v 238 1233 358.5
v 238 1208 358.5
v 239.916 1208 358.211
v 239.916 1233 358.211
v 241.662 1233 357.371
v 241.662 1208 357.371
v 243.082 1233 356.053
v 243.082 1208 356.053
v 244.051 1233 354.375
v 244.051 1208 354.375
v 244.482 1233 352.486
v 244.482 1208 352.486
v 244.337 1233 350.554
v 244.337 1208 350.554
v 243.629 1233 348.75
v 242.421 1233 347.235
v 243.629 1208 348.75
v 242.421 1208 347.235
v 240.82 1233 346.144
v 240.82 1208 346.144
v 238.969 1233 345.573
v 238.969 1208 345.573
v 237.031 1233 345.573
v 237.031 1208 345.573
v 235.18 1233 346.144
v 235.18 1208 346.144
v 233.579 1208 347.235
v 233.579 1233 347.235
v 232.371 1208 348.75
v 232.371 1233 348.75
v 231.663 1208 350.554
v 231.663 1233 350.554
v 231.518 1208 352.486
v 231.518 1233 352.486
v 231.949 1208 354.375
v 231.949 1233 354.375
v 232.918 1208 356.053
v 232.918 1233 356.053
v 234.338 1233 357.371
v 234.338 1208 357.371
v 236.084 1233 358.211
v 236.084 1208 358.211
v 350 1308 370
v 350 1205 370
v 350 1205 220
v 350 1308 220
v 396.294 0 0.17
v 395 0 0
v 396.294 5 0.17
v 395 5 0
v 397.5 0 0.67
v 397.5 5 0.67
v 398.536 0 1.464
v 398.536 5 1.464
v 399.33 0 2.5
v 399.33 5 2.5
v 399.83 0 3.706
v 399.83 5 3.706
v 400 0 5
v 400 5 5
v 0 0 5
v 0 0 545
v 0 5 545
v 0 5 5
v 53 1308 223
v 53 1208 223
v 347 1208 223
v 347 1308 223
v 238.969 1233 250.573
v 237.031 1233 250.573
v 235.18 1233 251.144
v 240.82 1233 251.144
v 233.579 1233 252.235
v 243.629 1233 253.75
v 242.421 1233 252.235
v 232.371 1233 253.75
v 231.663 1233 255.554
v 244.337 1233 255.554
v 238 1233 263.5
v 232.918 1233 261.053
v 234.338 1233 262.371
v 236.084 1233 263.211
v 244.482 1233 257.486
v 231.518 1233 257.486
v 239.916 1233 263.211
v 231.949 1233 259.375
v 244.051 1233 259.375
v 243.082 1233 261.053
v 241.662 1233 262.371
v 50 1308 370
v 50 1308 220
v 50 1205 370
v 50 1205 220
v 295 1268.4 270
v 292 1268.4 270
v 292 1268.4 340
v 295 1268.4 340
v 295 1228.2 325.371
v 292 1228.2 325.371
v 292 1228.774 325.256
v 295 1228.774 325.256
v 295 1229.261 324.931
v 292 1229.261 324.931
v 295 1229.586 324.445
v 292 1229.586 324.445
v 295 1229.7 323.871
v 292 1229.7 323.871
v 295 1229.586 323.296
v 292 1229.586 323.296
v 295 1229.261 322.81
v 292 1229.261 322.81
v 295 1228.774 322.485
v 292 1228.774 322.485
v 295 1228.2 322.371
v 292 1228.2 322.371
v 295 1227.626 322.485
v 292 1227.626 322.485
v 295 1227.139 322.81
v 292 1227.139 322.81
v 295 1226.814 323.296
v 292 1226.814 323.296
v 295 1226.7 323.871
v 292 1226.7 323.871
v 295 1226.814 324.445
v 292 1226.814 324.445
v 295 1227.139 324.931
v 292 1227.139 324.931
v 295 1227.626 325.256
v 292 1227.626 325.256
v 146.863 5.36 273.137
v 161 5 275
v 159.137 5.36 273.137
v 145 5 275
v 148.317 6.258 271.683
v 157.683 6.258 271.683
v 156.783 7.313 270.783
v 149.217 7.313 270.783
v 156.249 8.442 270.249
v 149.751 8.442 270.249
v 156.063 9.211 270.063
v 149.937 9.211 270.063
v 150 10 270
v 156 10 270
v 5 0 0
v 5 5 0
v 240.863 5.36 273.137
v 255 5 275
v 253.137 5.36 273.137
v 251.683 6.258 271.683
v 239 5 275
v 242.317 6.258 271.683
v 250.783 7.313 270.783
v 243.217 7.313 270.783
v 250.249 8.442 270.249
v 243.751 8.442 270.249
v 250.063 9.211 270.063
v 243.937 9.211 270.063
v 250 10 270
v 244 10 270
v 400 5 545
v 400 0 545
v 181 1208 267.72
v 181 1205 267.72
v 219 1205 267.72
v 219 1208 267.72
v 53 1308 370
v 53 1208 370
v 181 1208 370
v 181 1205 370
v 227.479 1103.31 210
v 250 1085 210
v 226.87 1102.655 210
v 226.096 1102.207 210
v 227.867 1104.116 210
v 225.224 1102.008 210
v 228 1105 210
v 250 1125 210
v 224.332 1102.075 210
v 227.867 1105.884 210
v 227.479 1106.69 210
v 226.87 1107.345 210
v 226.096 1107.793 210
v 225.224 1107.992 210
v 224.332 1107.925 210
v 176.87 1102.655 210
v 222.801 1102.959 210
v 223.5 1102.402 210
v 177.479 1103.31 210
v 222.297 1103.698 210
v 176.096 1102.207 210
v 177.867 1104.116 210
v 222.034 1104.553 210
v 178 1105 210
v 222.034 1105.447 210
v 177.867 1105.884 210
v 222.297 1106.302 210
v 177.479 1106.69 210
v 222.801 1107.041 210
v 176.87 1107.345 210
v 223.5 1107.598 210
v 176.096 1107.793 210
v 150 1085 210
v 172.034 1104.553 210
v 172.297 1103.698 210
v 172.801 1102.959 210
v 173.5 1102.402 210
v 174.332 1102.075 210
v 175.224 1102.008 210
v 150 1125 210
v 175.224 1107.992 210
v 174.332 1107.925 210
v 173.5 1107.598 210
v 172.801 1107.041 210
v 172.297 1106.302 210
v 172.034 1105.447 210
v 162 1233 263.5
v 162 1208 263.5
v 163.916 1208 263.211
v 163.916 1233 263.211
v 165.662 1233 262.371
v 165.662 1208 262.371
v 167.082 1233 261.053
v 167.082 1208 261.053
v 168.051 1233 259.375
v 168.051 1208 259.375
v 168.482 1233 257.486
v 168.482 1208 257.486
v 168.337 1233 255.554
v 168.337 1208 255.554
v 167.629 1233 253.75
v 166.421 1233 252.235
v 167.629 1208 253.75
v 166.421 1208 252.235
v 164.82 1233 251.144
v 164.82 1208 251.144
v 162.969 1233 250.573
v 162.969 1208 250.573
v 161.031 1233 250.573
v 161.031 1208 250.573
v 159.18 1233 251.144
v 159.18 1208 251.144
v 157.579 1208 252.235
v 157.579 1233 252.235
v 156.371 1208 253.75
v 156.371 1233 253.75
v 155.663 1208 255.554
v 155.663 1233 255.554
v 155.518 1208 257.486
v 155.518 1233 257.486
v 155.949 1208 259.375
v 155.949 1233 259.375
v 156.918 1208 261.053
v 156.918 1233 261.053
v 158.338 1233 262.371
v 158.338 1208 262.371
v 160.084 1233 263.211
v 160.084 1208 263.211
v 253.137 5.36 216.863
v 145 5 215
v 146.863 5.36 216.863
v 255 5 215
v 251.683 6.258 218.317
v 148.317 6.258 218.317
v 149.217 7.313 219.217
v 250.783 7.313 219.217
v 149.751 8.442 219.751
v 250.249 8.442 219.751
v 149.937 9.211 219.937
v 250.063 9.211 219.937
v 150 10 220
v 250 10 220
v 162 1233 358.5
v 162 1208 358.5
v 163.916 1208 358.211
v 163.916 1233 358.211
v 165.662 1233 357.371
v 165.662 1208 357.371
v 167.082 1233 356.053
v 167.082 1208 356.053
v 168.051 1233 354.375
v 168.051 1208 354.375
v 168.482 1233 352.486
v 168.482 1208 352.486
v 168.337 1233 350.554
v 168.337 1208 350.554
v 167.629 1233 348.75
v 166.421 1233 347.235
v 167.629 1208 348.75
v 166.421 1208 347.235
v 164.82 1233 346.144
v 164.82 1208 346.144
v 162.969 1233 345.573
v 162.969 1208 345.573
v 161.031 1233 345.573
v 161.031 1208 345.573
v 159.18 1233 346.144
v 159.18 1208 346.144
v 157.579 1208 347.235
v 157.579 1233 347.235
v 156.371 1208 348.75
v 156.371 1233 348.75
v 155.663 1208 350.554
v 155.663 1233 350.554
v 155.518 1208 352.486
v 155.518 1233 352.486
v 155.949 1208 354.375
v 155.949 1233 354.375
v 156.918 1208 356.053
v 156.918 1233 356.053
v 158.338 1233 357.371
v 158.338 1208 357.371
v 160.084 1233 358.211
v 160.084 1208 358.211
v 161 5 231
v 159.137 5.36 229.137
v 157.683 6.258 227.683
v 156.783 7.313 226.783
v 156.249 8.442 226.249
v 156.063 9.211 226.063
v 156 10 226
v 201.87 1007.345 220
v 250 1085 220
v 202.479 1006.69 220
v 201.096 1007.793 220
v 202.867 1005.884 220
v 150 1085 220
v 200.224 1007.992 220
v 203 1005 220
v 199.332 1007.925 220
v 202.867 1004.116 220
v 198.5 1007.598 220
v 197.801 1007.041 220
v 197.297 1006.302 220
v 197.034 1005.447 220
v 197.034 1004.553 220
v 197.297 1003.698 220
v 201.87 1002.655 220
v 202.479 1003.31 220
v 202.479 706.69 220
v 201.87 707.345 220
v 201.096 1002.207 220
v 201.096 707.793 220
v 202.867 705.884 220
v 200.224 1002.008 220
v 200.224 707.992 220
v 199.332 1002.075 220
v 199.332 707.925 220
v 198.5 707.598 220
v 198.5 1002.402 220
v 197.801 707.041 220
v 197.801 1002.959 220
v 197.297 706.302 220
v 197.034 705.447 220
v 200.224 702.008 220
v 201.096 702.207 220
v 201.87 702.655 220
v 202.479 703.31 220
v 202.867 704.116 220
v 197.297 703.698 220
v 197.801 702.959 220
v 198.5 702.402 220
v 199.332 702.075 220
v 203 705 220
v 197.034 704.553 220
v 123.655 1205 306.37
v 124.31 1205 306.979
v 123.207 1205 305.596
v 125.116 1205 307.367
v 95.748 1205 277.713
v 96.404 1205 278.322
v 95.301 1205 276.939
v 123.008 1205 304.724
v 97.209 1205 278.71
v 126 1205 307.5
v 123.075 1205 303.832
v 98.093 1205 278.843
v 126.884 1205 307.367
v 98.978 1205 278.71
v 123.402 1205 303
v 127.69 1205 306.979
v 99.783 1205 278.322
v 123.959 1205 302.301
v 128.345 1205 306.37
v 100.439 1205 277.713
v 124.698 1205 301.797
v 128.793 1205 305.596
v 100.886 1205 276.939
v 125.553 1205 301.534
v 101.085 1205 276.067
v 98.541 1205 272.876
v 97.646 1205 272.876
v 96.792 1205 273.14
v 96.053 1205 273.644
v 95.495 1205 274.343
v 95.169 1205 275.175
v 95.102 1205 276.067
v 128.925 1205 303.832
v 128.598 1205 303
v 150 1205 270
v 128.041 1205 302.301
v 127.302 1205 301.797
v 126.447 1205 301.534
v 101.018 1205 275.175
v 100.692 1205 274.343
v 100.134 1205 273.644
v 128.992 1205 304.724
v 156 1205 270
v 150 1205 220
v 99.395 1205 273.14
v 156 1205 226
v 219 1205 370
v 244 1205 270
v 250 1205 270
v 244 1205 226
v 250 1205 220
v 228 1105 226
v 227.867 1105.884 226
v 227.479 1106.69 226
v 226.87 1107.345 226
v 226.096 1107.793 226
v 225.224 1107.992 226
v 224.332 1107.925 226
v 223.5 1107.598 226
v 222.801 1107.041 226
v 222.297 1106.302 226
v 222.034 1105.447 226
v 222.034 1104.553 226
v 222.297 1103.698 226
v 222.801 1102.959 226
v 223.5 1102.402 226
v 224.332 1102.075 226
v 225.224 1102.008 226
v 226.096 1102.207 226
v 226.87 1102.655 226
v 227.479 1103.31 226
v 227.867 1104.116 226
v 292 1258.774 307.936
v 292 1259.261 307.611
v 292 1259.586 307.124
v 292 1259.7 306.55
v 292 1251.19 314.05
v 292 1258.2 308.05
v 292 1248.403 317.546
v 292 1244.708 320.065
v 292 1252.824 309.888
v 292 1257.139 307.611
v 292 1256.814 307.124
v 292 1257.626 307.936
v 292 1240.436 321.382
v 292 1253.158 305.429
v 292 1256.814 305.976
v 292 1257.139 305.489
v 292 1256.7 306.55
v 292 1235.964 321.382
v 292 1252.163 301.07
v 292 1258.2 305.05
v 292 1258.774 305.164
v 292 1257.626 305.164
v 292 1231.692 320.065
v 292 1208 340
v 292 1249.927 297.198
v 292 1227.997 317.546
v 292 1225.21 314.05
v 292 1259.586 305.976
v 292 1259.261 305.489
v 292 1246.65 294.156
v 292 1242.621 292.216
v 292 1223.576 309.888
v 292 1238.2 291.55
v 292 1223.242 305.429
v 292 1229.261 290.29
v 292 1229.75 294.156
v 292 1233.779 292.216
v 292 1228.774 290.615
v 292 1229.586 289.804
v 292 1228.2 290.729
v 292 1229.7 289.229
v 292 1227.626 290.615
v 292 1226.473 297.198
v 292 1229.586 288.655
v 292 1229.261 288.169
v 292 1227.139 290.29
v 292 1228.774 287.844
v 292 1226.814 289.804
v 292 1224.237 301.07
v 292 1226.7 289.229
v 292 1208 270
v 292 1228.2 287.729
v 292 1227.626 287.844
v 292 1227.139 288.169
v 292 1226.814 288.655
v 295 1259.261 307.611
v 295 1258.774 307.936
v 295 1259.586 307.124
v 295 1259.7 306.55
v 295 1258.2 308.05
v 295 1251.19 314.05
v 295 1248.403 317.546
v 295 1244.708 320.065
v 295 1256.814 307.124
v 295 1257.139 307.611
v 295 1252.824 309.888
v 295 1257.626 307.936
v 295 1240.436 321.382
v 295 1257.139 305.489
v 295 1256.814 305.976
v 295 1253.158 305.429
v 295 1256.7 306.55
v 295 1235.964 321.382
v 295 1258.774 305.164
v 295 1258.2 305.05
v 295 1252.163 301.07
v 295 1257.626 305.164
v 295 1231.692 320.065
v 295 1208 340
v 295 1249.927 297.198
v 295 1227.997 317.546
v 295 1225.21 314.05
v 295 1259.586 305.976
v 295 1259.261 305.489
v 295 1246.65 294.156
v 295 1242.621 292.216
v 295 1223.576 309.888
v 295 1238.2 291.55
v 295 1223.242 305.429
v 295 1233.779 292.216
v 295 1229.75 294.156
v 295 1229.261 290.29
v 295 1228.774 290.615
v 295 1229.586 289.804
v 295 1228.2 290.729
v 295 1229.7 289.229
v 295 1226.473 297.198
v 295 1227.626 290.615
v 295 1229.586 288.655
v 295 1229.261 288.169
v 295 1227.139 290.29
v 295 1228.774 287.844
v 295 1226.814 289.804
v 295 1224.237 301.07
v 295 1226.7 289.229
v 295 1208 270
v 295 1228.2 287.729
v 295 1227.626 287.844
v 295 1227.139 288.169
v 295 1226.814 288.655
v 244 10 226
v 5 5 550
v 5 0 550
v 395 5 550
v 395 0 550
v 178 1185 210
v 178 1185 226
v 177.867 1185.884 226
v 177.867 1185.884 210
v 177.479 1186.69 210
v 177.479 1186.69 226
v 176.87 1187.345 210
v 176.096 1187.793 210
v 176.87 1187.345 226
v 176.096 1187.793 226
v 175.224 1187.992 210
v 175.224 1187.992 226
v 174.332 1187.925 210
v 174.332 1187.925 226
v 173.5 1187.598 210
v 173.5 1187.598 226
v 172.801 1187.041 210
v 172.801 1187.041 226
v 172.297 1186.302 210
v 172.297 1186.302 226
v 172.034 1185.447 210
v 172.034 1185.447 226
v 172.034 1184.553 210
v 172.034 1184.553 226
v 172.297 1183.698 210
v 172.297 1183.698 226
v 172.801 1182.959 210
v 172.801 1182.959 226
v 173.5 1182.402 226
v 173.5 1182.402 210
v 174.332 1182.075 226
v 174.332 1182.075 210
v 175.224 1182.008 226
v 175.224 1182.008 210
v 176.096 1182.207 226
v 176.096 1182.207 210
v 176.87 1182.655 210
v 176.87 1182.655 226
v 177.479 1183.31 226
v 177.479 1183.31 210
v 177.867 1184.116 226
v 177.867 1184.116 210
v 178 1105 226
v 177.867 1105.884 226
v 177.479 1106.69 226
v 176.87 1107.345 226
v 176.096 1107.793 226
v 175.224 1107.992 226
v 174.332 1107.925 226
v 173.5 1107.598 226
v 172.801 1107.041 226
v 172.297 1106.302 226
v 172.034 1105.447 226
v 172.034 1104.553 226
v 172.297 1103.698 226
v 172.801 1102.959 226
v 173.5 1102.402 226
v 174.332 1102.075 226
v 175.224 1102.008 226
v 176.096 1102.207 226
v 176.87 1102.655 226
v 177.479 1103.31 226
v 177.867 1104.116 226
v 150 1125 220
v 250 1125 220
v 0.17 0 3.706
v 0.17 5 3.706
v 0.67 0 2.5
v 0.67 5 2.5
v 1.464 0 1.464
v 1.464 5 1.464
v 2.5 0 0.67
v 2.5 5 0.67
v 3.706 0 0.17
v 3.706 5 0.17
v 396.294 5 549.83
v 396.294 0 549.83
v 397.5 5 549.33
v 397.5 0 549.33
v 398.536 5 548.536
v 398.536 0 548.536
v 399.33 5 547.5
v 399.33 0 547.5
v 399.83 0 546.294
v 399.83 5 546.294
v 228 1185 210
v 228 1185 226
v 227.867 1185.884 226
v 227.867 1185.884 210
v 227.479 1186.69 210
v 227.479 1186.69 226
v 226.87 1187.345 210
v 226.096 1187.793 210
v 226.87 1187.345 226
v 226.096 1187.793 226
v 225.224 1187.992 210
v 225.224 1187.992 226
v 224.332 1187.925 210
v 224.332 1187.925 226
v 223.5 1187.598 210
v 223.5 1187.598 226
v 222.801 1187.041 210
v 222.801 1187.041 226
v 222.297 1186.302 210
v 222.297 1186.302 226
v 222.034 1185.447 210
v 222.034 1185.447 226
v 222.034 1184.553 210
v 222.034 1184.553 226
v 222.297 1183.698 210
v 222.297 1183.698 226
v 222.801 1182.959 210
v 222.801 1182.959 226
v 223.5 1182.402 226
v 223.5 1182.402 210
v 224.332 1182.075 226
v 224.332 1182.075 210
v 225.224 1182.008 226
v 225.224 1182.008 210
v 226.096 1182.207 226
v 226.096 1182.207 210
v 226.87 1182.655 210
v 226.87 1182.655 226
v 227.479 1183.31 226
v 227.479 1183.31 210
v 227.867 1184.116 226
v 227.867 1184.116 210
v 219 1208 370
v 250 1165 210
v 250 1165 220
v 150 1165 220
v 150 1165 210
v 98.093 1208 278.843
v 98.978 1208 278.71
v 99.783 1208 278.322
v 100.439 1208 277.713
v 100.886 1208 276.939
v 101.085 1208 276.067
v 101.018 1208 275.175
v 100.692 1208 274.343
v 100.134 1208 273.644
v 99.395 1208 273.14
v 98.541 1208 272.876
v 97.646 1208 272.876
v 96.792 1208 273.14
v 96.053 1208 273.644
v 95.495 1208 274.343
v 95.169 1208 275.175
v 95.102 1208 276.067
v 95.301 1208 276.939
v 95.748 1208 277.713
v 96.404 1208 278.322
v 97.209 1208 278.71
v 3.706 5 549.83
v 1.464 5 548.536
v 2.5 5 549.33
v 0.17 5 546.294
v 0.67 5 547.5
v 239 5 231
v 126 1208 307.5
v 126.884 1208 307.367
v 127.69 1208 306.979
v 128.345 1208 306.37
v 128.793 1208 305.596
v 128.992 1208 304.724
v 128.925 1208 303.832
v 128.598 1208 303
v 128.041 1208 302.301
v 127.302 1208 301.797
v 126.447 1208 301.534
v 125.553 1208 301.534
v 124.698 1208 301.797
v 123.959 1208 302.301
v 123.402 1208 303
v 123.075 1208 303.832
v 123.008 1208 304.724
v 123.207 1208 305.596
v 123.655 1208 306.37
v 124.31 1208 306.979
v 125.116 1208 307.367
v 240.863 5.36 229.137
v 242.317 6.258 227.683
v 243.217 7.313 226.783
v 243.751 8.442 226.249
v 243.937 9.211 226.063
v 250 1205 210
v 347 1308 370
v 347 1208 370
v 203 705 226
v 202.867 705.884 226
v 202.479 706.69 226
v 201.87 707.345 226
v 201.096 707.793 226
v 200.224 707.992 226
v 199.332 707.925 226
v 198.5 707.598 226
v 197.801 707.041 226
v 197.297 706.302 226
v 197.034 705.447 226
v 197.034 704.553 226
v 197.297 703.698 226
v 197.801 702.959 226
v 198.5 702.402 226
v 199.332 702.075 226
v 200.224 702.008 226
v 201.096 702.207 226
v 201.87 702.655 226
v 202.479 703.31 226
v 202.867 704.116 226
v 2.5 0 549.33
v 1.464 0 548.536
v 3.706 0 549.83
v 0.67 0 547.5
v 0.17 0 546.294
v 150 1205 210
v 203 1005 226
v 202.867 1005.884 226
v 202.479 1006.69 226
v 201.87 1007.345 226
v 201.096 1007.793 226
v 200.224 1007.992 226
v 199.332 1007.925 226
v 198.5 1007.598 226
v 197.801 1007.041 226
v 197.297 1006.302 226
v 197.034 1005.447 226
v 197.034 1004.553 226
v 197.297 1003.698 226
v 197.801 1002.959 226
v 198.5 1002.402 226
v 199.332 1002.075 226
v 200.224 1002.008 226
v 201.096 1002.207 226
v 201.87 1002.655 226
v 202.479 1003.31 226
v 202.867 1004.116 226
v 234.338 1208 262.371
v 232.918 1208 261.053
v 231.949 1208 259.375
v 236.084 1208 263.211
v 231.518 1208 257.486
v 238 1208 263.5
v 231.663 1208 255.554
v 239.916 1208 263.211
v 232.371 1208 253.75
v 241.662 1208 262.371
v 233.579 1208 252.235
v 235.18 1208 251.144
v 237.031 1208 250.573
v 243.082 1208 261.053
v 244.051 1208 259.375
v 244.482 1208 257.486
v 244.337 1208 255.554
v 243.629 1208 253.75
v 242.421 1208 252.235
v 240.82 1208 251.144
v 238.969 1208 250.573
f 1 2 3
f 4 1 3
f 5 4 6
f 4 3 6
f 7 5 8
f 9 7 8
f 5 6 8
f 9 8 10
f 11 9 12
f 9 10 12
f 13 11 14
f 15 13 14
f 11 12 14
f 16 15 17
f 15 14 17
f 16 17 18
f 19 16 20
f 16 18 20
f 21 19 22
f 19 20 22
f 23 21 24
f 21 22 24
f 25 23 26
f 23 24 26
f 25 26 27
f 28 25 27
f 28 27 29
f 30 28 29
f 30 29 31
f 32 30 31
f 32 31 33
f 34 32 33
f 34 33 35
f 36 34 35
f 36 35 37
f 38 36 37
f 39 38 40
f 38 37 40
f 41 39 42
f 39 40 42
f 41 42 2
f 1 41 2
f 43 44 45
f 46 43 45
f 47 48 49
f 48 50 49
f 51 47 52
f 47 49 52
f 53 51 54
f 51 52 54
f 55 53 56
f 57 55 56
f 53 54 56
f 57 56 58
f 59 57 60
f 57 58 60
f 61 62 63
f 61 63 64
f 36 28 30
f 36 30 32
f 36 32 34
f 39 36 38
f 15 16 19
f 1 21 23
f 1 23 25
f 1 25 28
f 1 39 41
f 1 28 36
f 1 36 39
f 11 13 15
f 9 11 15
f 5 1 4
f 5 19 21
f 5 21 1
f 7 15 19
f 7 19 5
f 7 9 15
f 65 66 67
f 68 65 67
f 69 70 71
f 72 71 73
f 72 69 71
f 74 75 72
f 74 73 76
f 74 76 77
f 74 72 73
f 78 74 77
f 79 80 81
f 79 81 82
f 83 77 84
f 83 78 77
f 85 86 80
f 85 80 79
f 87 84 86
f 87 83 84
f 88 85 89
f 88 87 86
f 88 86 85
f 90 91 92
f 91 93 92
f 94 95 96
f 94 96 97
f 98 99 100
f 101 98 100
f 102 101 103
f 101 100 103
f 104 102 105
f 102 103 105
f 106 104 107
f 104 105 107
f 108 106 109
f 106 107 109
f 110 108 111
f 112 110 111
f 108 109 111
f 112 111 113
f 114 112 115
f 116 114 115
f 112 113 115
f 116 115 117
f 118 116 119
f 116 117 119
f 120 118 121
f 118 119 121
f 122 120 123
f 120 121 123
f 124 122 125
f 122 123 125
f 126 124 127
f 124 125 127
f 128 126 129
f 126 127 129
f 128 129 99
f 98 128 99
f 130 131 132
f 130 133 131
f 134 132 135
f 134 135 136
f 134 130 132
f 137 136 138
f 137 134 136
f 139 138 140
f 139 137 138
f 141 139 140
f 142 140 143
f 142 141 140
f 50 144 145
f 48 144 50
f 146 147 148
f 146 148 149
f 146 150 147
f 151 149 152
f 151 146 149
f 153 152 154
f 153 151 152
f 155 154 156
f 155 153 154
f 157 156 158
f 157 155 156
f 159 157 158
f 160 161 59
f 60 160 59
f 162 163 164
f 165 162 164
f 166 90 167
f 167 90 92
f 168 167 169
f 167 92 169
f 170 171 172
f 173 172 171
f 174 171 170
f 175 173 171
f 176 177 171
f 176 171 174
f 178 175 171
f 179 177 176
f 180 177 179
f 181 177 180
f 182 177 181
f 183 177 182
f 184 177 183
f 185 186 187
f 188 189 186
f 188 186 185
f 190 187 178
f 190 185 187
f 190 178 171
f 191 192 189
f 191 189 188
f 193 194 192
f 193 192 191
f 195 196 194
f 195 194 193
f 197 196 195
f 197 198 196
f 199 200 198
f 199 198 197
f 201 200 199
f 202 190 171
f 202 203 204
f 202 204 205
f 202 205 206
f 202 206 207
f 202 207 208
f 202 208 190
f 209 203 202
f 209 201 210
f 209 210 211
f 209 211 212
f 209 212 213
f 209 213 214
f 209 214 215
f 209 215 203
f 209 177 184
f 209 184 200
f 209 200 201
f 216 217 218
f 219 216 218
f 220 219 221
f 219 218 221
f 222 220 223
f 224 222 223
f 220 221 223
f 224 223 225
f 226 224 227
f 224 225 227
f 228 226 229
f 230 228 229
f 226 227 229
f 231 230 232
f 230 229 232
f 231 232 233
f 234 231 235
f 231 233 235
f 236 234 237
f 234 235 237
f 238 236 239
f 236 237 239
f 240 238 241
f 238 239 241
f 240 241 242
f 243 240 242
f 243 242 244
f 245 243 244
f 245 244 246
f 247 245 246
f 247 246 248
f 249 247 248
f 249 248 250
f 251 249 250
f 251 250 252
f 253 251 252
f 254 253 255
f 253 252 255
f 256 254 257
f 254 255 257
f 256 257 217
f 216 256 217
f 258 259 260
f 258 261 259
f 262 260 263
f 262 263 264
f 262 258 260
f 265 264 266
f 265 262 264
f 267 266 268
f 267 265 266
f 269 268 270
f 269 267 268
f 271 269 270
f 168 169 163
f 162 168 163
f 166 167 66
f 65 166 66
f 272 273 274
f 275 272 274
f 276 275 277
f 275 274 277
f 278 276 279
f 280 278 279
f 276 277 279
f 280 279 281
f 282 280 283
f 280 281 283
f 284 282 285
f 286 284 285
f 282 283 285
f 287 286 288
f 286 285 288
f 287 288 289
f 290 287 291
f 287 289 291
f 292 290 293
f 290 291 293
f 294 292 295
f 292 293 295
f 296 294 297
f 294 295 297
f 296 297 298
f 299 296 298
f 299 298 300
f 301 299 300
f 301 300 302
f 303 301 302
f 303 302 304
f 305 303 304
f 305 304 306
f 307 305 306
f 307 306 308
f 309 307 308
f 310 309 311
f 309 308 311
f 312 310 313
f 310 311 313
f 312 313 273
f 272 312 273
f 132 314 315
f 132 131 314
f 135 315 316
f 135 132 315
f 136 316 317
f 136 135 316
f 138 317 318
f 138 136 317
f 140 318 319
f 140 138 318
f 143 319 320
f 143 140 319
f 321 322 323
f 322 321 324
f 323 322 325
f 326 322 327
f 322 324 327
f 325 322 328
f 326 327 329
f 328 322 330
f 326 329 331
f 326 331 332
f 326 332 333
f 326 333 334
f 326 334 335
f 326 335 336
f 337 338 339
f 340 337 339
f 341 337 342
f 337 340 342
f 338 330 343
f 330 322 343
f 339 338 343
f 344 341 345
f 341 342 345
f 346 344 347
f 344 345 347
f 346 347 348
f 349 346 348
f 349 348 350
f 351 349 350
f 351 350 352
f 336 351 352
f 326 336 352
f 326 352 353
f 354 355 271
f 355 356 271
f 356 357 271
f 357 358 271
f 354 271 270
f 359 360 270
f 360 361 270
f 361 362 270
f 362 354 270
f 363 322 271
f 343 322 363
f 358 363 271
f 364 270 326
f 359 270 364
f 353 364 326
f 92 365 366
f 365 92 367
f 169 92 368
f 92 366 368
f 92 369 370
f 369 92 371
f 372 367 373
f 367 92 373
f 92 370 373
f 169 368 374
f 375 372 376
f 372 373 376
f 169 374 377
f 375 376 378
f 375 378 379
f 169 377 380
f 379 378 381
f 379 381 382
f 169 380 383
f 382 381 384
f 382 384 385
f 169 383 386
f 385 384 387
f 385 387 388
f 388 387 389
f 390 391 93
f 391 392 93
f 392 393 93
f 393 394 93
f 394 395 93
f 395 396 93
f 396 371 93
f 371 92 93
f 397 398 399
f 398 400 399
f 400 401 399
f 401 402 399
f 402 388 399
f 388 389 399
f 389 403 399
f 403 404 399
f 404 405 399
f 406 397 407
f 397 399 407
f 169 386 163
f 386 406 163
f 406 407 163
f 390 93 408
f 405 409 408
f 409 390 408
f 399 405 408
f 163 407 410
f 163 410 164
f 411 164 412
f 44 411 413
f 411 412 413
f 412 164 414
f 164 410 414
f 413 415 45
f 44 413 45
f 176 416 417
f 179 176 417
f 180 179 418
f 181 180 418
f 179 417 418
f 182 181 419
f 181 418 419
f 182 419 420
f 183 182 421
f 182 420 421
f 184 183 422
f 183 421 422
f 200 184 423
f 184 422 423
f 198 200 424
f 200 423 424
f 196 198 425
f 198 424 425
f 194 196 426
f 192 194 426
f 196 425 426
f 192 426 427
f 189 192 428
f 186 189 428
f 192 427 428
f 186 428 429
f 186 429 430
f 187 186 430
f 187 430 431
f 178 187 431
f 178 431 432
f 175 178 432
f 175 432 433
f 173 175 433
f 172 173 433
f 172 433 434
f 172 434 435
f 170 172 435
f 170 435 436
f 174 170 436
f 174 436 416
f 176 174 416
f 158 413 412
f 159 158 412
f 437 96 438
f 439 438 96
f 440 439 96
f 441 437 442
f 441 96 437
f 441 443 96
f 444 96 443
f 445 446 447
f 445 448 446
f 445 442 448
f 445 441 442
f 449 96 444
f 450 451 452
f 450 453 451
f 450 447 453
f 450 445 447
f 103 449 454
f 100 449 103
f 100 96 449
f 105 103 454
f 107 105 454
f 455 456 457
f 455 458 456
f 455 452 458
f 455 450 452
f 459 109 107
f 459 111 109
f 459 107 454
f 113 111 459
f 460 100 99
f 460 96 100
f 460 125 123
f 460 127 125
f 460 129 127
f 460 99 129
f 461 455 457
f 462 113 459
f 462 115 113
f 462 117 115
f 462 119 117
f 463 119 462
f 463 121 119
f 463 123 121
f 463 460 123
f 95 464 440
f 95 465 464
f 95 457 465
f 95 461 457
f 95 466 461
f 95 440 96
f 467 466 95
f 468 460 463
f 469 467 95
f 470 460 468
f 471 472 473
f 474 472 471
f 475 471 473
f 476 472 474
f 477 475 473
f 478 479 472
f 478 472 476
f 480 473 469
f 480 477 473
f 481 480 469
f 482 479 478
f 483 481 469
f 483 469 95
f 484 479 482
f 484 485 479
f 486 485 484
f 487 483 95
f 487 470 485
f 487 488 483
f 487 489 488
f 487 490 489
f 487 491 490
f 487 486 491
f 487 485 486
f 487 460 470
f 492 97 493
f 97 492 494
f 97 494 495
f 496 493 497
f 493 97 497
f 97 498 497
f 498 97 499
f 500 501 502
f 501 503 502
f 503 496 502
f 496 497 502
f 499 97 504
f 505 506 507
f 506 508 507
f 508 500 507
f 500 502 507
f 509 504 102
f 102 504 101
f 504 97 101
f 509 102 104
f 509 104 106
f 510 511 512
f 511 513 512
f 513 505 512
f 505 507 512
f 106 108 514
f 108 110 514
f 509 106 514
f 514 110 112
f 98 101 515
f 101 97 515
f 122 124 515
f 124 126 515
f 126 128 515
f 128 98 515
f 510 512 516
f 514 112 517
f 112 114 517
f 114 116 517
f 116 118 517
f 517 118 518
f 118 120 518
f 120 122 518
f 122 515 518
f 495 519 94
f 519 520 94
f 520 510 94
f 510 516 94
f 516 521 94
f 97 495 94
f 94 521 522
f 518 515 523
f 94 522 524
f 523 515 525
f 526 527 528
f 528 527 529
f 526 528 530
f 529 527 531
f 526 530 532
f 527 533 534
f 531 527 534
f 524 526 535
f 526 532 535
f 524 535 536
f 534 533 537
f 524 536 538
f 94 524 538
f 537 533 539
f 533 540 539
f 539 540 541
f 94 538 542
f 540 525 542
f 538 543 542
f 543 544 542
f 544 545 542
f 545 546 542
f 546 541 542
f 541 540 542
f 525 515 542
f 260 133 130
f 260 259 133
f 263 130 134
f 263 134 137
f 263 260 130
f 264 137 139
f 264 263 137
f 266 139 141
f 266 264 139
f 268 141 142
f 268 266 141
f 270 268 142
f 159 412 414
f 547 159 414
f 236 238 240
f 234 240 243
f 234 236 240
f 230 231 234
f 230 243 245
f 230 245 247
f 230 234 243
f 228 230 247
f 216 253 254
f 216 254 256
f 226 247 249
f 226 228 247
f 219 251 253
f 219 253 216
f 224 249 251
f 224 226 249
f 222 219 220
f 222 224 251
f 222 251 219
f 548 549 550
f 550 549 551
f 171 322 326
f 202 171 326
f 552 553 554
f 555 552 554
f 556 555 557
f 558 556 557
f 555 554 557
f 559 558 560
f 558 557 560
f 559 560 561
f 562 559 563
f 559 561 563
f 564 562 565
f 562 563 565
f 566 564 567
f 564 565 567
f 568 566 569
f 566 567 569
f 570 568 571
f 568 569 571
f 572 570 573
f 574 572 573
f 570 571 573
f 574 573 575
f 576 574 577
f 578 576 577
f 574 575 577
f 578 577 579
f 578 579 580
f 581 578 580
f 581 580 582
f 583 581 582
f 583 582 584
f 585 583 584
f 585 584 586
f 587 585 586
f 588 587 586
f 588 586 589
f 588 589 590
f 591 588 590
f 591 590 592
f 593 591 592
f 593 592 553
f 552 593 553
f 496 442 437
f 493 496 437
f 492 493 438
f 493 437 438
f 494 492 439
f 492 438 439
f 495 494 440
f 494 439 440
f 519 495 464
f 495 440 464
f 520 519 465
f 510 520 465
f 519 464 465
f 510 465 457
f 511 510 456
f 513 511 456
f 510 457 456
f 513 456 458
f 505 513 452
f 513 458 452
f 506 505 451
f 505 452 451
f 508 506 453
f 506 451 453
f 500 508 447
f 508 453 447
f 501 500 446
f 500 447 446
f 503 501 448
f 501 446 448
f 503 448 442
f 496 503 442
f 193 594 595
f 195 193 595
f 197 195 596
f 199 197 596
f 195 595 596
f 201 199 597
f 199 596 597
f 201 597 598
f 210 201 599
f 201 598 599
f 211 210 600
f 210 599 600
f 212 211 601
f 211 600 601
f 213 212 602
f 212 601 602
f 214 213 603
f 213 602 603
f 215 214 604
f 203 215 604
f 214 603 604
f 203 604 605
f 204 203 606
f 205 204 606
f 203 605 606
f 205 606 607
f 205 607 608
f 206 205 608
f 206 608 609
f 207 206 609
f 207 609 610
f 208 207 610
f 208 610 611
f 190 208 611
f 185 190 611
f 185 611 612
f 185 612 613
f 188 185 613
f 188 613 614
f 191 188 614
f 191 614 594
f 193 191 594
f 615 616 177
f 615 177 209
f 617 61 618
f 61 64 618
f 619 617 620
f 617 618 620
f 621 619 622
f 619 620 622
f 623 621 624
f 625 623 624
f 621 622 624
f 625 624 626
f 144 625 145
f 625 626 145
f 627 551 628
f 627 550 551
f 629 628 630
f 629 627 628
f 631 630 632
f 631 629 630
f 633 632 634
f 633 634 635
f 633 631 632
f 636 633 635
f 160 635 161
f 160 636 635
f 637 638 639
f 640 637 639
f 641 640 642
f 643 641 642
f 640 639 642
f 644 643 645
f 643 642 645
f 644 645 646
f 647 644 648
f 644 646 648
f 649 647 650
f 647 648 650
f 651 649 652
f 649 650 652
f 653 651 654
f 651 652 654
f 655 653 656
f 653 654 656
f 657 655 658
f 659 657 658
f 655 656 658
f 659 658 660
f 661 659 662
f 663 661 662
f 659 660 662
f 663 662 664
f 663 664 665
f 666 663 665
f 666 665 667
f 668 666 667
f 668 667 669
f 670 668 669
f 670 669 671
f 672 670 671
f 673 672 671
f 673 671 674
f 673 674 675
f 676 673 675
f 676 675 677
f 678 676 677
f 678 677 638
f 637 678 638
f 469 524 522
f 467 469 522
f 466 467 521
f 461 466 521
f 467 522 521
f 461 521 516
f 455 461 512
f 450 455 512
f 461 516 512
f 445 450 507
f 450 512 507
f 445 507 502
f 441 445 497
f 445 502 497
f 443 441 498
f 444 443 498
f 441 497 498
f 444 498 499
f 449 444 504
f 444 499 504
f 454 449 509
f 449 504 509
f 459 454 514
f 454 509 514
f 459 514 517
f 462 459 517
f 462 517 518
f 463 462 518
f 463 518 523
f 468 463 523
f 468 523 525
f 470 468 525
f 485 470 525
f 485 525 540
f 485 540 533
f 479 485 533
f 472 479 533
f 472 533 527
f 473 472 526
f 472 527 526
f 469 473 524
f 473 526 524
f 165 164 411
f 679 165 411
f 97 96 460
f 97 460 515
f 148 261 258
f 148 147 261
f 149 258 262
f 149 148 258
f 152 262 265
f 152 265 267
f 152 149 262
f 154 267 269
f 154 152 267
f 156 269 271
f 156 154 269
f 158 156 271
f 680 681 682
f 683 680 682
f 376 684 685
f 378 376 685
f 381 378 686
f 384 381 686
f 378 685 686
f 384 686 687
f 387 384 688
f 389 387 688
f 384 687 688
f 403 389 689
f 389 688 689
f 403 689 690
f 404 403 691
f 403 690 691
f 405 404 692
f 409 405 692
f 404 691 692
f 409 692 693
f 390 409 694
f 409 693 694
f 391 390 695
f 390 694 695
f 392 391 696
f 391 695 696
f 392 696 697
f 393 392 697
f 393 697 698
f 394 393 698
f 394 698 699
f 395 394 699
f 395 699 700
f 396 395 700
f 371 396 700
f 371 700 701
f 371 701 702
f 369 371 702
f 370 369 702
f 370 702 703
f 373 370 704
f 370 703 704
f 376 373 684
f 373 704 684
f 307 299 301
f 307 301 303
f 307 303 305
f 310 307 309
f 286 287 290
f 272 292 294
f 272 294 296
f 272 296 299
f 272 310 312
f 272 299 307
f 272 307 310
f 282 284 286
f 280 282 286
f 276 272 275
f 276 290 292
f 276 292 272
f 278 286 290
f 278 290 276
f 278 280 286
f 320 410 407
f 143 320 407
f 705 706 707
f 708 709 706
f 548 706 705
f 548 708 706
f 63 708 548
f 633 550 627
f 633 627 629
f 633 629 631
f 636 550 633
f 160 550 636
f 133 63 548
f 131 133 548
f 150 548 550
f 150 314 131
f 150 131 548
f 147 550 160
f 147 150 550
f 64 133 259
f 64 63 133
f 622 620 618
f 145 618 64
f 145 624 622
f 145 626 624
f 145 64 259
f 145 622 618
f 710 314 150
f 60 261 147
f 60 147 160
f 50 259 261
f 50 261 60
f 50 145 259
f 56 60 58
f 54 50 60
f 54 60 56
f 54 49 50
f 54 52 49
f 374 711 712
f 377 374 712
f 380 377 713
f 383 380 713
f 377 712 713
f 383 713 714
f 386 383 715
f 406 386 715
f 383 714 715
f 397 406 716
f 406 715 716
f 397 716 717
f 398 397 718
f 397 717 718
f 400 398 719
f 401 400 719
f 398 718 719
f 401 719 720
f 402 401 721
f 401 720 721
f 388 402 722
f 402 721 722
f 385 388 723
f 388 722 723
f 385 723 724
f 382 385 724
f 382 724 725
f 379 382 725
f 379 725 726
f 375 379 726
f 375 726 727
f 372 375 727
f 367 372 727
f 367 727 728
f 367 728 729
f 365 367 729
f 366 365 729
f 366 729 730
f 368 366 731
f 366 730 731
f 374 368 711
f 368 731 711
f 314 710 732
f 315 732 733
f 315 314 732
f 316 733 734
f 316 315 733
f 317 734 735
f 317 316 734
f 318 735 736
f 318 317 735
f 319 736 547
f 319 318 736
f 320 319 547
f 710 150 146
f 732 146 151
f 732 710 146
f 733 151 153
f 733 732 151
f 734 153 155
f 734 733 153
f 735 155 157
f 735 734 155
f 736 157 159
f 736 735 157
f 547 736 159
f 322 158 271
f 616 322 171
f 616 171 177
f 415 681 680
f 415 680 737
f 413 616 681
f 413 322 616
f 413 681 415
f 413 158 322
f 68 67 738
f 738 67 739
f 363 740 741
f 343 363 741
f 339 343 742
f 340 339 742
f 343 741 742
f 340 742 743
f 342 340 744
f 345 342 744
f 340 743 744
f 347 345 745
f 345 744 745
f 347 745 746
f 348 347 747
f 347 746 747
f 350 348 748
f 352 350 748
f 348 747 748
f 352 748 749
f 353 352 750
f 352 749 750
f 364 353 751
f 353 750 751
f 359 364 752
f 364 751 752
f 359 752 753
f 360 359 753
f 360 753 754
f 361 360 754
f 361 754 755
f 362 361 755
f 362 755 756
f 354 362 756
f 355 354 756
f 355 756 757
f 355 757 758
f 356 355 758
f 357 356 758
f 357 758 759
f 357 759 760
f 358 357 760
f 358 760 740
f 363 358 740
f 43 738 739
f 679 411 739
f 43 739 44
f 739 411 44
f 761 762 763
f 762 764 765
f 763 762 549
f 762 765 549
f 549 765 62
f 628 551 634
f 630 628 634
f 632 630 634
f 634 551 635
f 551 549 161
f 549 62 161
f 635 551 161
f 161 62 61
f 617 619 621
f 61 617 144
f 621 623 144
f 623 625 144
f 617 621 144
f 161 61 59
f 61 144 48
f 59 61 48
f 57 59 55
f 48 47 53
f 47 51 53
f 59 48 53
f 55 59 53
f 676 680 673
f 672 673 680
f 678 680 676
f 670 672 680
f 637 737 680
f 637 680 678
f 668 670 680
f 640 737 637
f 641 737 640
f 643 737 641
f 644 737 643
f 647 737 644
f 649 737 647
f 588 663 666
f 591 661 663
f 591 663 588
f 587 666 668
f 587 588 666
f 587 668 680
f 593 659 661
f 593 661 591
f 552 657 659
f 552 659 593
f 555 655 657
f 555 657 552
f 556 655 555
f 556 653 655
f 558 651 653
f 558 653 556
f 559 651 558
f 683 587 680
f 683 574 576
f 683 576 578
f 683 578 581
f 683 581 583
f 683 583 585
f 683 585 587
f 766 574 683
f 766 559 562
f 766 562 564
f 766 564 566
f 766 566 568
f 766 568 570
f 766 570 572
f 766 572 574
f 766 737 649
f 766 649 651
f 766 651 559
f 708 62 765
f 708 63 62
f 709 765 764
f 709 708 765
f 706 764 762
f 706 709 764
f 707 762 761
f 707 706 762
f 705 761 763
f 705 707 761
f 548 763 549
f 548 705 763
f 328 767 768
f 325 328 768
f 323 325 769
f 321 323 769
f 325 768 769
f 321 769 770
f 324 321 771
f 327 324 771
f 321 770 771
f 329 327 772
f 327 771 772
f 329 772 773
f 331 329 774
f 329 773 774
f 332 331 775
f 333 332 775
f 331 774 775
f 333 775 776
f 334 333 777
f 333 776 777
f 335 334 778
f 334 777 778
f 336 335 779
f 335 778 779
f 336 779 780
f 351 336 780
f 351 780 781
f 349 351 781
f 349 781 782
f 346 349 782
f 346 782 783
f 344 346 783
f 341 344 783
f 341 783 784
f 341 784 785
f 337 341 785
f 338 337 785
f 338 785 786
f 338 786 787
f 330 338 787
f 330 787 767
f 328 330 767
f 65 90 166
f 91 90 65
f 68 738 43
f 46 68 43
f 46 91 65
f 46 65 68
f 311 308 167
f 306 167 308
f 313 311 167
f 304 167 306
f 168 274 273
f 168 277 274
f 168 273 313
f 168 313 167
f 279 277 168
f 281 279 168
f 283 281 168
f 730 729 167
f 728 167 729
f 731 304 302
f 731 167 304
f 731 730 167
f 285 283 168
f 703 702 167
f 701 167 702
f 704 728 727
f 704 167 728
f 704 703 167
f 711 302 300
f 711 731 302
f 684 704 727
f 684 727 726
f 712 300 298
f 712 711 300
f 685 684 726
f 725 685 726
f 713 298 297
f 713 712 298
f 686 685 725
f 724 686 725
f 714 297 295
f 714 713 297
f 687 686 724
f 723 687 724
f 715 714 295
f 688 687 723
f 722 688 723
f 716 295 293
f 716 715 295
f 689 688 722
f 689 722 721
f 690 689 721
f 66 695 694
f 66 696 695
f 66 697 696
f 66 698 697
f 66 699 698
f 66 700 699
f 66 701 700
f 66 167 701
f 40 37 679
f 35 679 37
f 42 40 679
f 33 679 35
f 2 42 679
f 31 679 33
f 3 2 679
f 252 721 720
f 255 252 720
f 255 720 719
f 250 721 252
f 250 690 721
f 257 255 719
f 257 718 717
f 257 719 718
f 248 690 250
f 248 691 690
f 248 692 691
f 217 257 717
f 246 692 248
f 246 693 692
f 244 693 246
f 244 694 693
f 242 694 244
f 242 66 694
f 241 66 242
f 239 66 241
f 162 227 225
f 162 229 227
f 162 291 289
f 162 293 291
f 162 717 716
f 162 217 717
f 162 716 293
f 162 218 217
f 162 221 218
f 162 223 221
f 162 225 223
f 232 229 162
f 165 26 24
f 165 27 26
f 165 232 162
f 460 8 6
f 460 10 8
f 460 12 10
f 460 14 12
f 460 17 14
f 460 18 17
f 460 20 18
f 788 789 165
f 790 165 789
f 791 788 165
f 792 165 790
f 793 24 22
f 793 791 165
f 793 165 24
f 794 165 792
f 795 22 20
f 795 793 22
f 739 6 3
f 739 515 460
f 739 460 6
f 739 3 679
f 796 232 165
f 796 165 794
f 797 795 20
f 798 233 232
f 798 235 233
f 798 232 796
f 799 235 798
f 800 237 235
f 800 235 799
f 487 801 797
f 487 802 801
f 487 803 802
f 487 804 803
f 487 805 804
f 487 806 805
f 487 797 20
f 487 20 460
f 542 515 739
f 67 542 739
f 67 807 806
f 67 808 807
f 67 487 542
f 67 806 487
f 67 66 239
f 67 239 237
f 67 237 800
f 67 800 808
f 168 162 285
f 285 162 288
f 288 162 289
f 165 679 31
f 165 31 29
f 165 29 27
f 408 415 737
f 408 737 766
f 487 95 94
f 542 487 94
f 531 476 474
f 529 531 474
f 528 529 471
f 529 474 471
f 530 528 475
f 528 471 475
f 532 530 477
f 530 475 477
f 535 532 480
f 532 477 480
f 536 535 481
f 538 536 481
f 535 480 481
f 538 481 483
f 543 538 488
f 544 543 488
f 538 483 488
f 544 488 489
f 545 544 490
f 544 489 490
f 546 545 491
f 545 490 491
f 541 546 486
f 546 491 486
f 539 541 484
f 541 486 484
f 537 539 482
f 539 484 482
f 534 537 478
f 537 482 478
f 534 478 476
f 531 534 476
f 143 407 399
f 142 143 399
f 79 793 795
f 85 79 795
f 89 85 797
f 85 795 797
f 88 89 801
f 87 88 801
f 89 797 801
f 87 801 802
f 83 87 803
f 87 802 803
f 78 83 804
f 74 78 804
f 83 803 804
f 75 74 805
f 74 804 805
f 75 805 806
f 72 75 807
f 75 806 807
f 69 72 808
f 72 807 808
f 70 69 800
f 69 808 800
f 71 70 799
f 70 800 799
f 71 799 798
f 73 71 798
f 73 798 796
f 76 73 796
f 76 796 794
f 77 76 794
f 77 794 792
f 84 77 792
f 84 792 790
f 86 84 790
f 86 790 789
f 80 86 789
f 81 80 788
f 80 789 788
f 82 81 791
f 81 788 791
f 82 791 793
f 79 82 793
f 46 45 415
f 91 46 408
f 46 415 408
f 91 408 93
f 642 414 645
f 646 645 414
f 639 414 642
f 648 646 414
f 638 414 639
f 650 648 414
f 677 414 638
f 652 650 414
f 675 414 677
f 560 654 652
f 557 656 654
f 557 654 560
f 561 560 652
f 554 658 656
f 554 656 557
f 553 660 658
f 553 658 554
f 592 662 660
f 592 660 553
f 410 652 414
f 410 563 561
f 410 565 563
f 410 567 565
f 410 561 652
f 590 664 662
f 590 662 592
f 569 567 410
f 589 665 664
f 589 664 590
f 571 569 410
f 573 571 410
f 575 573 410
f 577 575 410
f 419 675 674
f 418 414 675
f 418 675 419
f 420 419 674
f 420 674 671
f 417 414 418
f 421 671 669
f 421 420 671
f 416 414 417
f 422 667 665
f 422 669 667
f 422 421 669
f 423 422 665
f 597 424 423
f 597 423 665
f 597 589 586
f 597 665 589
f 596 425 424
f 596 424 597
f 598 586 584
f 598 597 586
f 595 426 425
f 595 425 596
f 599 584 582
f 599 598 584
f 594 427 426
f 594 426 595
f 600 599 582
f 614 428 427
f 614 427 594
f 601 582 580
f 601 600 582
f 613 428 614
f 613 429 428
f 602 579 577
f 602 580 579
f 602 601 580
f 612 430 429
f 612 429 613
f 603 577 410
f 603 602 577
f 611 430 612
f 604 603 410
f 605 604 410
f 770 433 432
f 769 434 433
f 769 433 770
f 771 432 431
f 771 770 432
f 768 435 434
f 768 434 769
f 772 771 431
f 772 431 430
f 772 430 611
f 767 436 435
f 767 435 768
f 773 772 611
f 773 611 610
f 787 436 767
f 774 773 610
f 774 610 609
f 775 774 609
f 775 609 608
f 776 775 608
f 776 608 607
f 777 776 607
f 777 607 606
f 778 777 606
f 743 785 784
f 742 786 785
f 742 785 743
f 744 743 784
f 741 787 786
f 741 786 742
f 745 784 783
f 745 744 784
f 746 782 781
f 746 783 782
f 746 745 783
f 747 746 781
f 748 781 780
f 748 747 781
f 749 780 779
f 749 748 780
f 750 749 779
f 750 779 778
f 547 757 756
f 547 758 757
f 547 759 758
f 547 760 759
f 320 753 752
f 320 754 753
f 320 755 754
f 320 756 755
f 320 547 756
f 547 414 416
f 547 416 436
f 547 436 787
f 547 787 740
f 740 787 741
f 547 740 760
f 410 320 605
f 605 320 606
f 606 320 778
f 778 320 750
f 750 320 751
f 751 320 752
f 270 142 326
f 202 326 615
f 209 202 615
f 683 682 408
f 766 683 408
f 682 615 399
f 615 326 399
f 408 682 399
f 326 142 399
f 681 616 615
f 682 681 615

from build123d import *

# Parameters (mm, degrees)
SKETCH1_W             = 400
SKETCH1_H             = 550
BOSS_EXTRUDE2_DEPTH   = 5
EXTRUDE_THIN1_DEPTH   = 1200
FILLET3_R             = 5
BOSS_EXTRUDE4_DEPTH   = 3
SKETCH8_W             = 3
SKETCH8_H             = 70
BOSS_EXTRUDE5_DEPTH   = 60.4
SKETCH9_R             = 15
CUT_EXTRUDE2_DEPTH    = 3
SKETCH10_R            = 1.5
CUT_EXTRUDE3_DEPTH    = 3
SKETCH12_R            = 6.5
BOSS_EXTRUDE6_DEPTH   = 25
SKETCH13_R            = 3
CUT_EXTRUDE5_DEPTH    = 3
EXTRUDE_THIN2_DEPTH   = 100
F_6_0MM_DOWEL_HOLE1_D = 6
SKETCH18_W            = 100
SKETCH18_H            = 40
BOSS_EXTRUDE7_DEPTH   = 10
F_6_0MM_DOWEL_HOLE2_D = 6


with BuildPart() as part:
    # Sketch1 → Boss-Extrude2 (new body)
    with BuildSketch(Plane(origin=(0, 0, 0), x_dir=(1, 0, 0), z_dir=(0, 1, 0))):
        with Locations((200, -275)):
            Rectangle(SKETCH1_W, SKETCH1_H)
    extrude(amount=BOSS_EXTRUDE2_DEPTH)

    # Sketch2 → Extrude-Thin1 (add)
    with BuildSketch(Plane(origin=(0, 5, 0), x_dir=(1, 0, 0), z_dir=(0, 1, 0))):
        Polygon((150, -270), (150, -220), (250, -220), (250, -270), (244, -270), (244, -226), (156, -226), (156, -270), align=None)
    extrude(amount=EXTRUDE_THIN1_DEPTH)

    # Fillet3
    fillet3_edges = [part.edges().sort_by_distance(p)[0] for p in [
        (244, 5, 248),
        (156, 5, 248),
        (200, 5, 226),
        (153, 5, 270),
        (150, 5, 245),
        (200, 5, 220),
        (250, 5, 245),
        (247, 5, 270),
        (0, 2.5, 0),
        (400, 2.5, 0),
        (400, 2.5, 550),
        (0, 2.5, 550),
    ]]
    fillet(fillet3_edges, radius=FILLET3_R)

    # Sketch7 → Boss-Extrude4 (add)
    with BuildSketch(Plane(origin=(0, 1205, 0), x_dir=(1, 0, 0), z_dir=(0, 1, 0))):
        Polygon((350, -220), (50, -220), (50, -370), (181, -370), (181, -267.719735963), (219, -267.719735963), (219, -370), (350, -370), align=None)
    extrude(amount=BOSS_EXTRUDE4_DEPTH)

    # Sketch8 → Boss-Extrude5 (add)
    with BuildSketch(Plane(origin=(0, 1208, 0), x_dir=(1, 0, 0), z_dir=(0, 1, 0))):
        with Locations((293.5, -305)):
            Rectangle(SKETCH8_W, SKETCH8_H)
    extrude(amount=BOSS_EXTRUDE5_DEPTH)

    # Sketch9 → Cut-Extrude2 (cut)
    with BuildSketch(Plane(origin=(295, 0, 0), x_dir=(0, 0, -1), z_dir=(1, 0, 0))):
        with Locations((-306.55, 1238.2)):
            Circle(SKETCH9_R)
    extrude(amount=-CUT_EXTRUDE2_DEPTH, mode=Mode.SUBTRACT)

    # Sketch10 → Cut-Extrude3 (cut)
    with BuildSketch(Plane.ZY.offset(-292)):
        with Locations((306.55, 1258.2)):
            Circle(SKETCH10_R)
        with Locations((289.229491924, 1228.2)):
            Circle(SKETCH10_R)
        with Locations((323.870508076, 1228.2)):
            Circle(SKETCH10_R)
    extrude(amount=-CUT_EXTRUDE3_DEPTH, mode=Mode.SUBTRACT)

    # Sketch12 → Boss-Extrude6 (add)
    with BuildSketch(Plane(origin=(0, 1208, 0), x_dir=(1, 0, 0), z_dir=(0, 1, 0))):
        with Locations(Location((162, -352, 0), (0, 0, 270))):
            Circle(SKETCH12_R)
        with Locations(Location((162, -257, 0), (0, 0, 270))):
            Circle(SKETCH12_R)
        with Locations(Location((238, -257, 0), (0, 0, 270))):
            Circle(SKETCH12_R)
        with Locations(Location((238, -352, 0), (0, 0, 270))):
            Circle(SKETCH12_R)
    extrude(amount=BOSS_EXTRUDE6_DEPTH)

    # Sketch13 → Cut-Extrude5 (cut)
    with BuildSketch(Plane(origin=(0, 1208, 0), x_dir=(1, 0, 0), z_dir=(0, 1, 0))):
        with Locations(Location((126, -304.5, 0), (0, 0, 270))):
            Circle(SKETCH13_R)
        with Locations(Location((98.09349971, -275.842937318, 0), (0, 0, 270))):
            Circle(SKETCH13_R)
    extrude(amount=-CUT_EXTRUDE5_DEPTH, mode=Mode.SUBTRACT)

    # Sketch15 → Extrude-Thin2 (add)
    with BuildSketch(Plane(origin=(0, 1208, 0), x_dir=(1, 0, 0), z_dir=(0, 1, 0))):
        Polygon((350, -370), (350, -220), (50, -220), (50, -370), (53, -370), (53, -223), (347, -223), (347, -370), align=None)
    extrude(amount=EXTRUDE_THIN2_DEPTH)

    # Ø6.0mm Dowel Hole1 (through all)
    with Locations(Plane(origin=(0, 0, 220), x_dir=(-1, 0, 0), z_dir=(0, 0, -1))):
        with Locations((-200, 1005), (-200, 705)):
            Hole(F_6_0MM_DOWEL_HOLE1_D / 2)

    # Sketch18 → Boss-Extrude7 (add)
    with BuildSketch(Plane(origin=(0, 0, 220), x_dir=(-1, 0, 0), z_dir=(0, 0, -1))):
        with Locations((-200, 1185)):
            Rectangle(SKETCH18_W, SKETCH18_H)
        with Locations((-200, 1105)):
            Rectangle(SKETCH18_W, SKETCH18_H)
    extrude(amount=BOSS_EXTRUDE7_DEPTH)

    # Ø6.0mm Dowel Hole2 (through all)
    with Locations(Plane(origin=(0, 0, 210), x_dir=(-1, 0, 0), z_dir=(0, 0, -1))):
        with Locations((-225, 1185), (-175, 1185), (-175, 1105), (-225, 1105)):
            Hole(F_6_0MM_DOWEL_HOLE2_D / 2)


solid = part.part
